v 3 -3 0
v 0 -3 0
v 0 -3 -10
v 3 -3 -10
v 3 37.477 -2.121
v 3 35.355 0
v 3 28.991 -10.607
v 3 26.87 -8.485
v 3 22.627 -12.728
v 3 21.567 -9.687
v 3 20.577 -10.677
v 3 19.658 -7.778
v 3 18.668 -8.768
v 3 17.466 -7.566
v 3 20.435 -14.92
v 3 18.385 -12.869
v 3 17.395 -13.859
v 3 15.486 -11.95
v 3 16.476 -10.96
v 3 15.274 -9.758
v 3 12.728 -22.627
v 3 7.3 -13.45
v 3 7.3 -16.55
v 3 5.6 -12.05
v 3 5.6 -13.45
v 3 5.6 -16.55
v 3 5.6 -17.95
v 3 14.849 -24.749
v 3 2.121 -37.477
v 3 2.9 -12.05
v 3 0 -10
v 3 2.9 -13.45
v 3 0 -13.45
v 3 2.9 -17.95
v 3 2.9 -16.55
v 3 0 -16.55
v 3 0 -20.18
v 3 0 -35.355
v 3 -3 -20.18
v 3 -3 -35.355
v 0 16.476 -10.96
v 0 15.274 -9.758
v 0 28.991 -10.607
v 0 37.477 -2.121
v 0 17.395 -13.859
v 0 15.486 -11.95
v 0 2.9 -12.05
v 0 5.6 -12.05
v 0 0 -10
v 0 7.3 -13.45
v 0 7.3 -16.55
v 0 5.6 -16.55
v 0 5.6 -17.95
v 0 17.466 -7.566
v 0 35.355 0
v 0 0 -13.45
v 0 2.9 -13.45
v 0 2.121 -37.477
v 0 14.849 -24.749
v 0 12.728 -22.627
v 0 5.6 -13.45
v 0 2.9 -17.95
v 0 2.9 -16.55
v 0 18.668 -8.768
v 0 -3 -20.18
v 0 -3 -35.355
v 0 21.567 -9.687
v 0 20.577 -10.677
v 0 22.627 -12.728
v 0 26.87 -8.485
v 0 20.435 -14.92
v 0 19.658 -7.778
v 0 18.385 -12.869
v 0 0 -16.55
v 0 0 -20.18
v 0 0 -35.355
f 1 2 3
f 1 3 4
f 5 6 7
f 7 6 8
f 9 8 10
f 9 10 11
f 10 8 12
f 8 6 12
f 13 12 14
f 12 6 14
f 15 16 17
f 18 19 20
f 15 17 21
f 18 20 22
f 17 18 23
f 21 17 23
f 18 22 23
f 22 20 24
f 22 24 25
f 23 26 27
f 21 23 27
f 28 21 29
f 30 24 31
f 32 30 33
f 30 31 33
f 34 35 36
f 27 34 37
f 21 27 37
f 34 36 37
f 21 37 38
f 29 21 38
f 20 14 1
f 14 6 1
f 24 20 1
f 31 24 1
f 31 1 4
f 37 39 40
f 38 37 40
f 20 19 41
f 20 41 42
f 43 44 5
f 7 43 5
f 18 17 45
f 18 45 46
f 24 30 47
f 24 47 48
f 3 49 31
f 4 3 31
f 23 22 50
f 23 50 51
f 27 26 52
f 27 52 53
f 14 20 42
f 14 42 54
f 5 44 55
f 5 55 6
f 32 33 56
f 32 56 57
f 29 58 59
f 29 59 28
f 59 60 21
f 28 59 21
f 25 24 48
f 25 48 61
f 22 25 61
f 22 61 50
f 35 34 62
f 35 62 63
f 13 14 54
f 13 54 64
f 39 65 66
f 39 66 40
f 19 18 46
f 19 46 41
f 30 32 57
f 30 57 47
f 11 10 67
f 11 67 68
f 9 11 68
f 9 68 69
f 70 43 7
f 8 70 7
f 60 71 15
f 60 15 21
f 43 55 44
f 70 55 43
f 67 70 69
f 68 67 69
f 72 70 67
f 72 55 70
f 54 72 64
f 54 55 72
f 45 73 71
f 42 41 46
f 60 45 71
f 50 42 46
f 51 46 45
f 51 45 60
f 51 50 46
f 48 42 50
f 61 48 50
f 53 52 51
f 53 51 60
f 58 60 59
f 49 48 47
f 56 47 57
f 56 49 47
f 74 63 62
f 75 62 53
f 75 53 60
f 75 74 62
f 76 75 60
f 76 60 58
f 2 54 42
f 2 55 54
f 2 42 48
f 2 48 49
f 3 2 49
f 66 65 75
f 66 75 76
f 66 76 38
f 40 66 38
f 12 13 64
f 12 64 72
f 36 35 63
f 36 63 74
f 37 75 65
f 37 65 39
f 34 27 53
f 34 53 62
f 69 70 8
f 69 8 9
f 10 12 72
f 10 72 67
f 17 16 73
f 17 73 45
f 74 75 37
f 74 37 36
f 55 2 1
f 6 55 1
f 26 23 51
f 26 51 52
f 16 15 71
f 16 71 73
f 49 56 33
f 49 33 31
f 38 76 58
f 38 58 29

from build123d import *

# Parameters (mm, degrees)
BOSS_EXTRUDE1_DEPTH = 3
SKETCH4_W           = 3
SKETCH4_H           = 10
SKETCH4_H_2         = 15.175339059
BOSS_EXTRUDE3_DEPTH = 3
CUT_EXTRUDE1_DEPTH  = 10
SKETCH6_W           = 3
SKETCH6_H           = 12
SKETCH6_H_2         = 18
BOSS_EXTRUDE4_DEPTH = 3
CUT_EXTRUDE2_DEPTH  = 3


with BuildPart() as part:
    # Sketch2 → Boss-Extrude1 (new body)
    with BuildSketch(Plane(origin=(0, 0, 0), x_dir=(0, 0, -1), z_dir=(1, 0, 0))):
        Polygon((0, 0), (0, 35.355339059), (35.355339059, 0), align=None)
    extrude(amount=BOSS_EXTRUDE1_DEPTH)

    # Sketch4 → Boss-Extrude3 (add)
    with BuildSketch(Plane.XZ):
        with Locations((1.5, -5)):
            Rectangle(SKETCH4_W, SKETCH4_H)
        with Locations((1.5, -27.76766953)):
            Rectangle(SKETCH4_W, SKETCH4_H_2)
    extrude(amount=BOSS_EXTRUDE3_DEPTH)

    # Sketch5 → Cut-Extrude1 (cut)
    with BuildSketch(Plane(origin=(3, 0, 0), x_dir=(0, 0, -1), z_dir=(1, 0, 0))):
        Polygon((13.45, 0), (13.45, 2.9), (12.05, 2.9), (12.05, 5.6), (13.45, 5.6), (13.45, 7.3), (16.55, 7.3), (16.55, 5.6), (17.95, 5.6), (17.95, 2.9), (16.55, 2.9), (16.55, 0), align=None)
    extrude(amount=-CUT_EXTRUDE1_DEPTH, mode=Mode.SUBTRACT)

    # Sketch6 → Boss-Extrude4 (add)
    with BuildSketch(Plane(origin=(0, 17.67766953, -17.67766953), x_dir=(1, 0, 0), z_dir=(0, 0.7071067811865515, -0.7071067811865437))):
        with Locations((1.5, -19)):
            Rectangle(SKETCH6_W, SKETCH6_H)
        with Locations((1.5, 16)):
            Rectangle(SKETCH6_W, SKETCH6_H_2)
    extrude(amount=BOSS_EXTRUDE4_DEPTH)

    # Sketch7 → Cut-Extrude2 (cut)
    with BuildSketch(Plane(origin=(3, 0, 0), x_dir=(0, 0, -1), z_dir=(1, 0, 0))):
        Polygon((14.919953083, 20.435385976), (12.869343418, 18.384776311), (13.859292911, 17.394826817), (11.950104602, 15.485638508), (10.960155108, 16.475588002), (9.75807358, 15.273506474), (7.566042559, 17.465537495), (8.768124087, 18.667619023), (7.778174593, 19.657568517), (9.687362902, 21.566756826), (10.677312396, 20.576807333), (12.727922061, 22.627416998), align=None)
    extrude(amount=-CUT_EXTRUDE2_DEPTH, mode=Mode.SUBTRACT)


solid = part.part
